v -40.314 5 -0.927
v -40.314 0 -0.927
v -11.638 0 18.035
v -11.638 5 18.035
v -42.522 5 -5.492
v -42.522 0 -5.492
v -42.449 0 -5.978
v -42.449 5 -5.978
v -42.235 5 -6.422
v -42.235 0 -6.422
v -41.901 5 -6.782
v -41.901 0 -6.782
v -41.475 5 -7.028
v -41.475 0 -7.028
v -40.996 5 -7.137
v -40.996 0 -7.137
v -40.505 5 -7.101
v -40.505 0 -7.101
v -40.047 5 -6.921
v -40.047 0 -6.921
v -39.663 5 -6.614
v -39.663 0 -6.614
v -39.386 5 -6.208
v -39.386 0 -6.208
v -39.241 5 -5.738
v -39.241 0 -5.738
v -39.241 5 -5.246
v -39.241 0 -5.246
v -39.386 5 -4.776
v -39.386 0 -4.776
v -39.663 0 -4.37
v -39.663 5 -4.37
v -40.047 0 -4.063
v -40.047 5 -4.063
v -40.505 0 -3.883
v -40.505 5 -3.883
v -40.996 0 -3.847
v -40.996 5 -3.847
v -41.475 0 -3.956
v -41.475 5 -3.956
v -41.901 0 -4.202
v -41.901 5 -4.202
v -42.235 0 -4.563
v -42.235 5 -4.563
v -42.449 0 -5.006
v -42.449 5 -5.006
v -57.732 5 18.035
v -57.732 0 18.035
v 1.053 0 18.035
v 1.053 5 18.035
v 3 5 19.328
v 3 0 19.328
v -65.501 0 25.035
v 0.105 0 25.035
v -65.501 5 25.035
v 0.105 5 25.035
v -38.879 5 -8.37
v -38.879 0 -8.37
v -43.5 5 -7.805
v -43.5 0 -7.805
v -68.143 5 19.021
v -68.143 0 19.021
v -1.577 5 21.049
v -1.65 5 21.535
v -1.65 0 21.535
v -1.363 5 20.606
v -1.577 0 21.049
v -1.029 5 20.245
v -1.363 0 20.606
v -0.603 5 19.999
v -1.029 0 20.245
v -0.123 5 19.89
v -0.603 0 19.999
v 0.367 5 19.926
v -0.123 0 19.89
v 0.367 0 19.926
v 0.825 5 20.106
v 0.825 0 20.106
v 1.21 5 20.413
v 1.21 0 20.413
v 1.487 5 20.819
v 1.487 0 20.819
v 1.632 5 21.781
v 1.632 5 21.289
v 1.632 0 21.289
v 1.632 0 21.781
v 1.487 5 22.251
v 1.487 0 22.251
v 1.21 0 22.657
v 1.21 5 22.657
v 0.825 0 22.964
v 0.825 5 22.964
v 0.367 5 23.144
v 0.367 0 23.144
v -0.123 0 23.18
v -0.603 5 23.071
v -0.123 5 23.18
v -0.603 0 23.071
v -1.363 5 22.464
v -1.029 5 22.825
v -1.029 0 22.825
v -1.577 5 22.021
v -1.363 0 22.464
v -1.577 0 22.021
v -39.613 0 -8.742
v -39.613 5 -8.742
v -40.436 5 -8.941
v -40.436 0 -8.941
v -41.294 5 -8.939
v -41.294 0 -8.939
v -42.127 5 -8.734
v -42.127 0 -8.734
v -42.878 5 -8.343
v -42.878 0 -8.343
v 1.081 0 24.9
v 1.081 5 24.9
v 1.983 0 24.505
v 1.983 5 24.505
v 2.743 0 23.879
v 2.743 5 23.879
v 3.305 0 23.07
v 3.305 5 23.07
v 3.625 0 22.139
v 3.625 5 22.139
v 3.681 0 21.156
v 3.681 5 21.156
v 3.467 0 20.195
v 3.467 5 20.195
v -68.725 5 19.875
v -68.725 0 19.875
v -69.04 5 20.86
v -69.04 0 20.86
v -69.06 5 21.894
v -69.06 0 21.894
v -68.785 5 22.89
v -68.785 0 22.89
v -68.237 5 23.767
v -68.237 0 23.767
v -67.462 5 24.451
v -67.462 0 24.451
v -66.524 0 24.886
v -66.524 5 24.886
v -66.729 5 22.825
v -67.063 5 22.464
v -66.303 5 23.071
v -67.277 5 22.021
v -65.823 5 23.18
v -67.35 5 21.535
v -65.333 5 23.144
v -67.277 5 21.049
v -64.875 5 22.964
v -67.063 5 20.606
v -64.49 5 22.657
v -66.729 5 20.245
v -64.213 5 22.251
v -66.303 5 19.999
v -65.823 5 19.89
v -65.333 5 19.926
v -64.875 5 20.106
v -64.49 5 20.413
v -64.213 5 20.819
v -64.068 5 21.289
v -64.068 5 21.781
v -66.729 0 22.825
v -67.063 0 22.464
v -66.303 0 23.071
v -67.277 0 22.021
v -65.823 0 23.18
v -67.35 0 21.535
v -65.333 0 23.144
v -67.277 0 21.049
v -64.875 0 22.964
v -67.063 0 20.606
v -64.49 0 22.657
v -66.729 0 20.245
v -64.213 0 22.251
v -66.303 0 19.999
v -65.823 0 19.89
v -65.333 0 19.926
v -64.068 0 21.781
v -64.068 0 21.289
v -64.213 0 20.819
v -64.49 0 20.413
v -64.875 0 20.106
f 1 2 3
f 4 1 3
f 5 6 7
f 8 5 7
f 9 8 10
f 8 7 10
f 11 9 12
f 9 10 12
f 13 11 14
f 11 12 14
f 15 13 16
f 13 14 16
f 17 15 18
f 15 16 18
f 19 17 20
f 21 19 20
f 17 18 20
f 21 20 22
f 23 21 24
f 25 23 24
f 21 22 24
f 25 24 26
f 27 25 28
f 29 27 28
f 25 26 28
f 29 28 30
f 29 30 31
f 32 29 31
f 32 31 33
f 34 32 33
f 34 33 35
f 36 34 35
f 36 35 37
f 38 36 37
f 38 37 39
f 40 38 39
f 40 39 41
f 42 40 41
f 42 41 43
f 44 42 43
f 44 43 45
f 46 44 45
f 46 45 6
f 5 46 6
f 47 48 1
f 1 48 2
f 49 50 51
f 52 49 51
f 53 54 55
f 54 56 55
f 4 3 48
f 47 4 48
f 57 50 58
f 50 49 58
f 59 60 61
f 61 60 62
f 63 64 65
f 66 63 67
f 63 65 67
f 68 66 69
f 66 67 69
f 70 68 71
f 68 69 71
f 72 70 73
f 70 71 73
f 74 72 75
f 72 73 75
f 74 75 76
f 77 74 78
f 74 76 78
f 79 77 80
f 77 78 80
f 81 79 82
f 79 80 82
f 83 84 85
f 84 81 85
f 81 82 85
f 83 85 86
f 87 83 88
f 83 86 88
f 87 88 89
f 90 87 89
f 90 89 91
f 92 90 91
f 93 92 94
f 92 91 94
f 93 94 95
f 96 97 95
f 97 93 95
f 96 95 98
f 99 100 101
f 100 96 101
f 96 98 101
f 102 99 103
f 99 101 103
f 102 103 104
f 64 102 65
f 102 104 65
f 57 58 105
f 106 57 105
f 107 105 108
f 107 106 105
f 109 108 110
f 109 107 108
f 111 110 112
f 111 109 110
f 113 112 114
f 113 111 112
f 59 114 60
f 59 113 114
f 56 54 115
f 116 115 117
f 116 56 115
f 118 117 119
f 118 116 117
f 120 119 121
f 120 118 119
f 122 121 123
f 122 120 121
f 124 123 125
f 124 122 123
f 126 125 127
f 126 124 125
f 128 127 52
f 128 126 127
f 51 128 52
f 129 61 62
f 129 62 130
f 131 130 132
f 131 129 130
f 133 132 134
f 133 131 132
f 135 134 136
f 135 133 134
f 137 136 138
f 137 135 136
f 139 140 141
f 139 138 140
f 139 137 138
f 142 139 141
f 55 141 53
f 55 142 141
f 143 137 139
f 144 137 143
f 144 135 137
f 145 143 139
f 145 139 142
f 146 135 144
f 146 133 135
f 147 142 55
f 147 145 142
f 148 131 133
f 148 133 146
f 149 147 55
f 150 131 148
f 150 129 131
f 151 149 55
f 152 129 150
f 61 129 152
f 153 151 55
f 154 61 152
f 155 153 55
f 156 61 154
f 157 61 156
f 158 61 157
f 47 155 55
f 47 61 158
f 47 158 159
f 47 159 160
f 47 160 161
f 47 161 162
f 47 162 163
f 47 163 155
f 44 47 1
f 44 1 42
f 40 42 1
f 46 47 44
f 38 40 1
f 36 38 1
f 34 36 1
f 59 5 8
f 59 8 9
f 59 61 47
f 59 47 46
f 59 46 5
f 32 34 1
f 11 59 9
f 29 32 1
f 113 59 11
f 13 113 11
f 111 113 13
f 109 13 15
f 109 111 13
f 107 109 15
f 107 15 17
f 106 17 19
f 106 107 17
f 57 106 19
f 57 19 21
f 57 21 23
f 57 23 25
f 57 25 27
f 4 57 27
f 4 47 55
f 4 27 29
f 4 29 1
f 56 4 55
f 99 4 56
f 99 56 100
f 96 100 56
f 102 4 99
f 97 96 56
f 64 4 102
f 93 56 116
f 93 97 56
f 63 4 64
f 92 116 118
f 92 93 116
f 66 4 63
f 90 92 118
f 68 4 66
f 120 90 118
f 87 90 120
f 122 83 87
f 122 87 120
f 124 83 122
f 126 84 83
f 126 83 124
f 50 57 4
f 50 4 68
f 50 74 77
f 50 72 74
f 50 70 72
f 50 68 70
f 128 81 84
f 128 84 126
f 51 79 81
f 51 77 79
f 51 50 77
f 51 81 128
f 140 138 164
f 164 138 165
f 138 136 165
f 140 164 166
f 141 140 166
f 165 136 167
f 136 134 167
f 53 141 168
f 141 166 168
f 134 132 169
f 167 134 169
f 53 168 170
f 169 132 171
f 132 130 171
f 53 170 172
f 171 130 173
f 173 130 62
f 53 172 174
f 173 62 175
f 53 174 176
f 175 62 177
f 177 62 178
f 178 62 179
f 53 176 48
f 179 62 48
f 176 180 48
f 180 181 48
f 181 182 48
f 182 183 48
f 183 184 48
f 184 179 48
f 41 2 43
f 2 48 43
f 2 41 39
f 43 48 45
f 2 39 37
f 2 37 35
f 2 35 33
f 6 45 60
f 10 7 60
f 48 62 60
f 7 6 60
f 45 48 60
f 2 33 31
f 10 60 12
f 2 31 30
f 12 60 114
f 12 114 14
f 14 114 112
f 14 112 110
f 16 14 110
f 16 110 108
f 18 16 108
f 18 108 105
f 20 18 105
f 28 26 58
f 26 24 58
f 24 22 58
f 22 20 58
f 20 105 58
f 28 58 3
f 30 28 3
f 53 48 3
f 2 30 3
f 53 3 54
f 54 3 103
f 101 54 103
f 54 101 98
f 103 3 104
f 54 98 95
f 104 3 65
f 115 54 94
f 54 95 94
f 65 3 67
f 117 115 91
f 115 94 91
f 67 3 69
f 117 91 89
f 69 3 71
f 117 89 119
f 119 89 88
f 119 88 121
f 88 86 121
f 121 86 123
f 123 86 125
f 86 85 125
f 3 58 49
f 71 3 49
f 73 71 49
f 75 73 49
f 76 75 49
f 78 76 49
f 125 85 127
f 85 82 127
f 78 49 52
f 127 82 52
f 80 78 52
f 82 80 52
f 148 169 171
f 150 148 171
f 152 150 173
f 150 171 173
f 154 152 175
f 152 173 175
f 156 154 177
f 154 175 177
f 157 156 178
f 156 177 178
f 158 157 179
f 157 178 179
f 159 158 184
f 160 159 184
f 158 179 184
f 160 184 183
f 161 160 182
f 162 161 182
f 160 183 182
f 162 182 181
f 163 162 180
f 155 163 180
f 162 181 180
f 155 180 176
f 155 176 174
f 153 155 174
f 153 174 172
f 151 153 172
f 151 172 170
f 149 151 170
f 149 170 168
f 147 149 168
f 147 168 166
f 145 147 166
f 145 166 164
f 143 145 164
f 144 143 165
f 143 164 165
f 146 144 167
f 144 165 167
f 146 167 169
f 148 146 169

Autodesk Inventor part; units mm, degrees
ref_plane "YZ Plane" through (0, 0, 0) normal (1, 0, 0) x (0, 1, 0)
ref_plane "XZ Plane" through (0, 0, 0) normal (0, 1, 0) x (-1, 0, 0)
ref_plane "XY Plane" through (0, 0, 0) normal (0, 0, 1) x (1, 0, 0)
sketch "Sketch1" plane through (0, 0, 0) normal (0, 1, 0) x (-1, 0, 0)
  line L0 (0, 21.535) -> (65.7, 21.535)
  line L1 (0, 21.535) -> (40.8722, -5.4921)
  line L2 (0, 21.535) -> (49, 21.535) construction
  line L3 (40.8722, -5.4921) -> (65.7, 21.535)
  line L4 (65.7, 21.535) -> (68.7, 21.535)
  line L5 (68.7, 21.535) -> (0, 21.535)
  line L6 (0, 21.535) -> (-3, 21.535)
  line L7 (40.8722, -5.4921) -> (43.3746, -7.1468)
  line L8 (65.7, 21.535) -> (38.8426, -7.7015)
  line L9 (137.4, 18.035) -> (137.4, 25.035)
  line L10 (137.4, 25.035) -> (0, 25.035)
  line L11 (0, 25.035) -> (0, 18.035)
  line L12 (0, 18.035) -> (137.4, 18.035)
  line L13 (137.4, 18.035) -> (0, 25.035) construction
  line L14 (137.4, 25.035) -> (0, 18.035) construction
  line L15 (93.1053, 46.1943) -> (87.9503, 50.9298)
  line L16 (87.9503, 50.9298) -> (38.2947, -3.1243)
  line L17 (38.2947, -3.1243) -> (43.4497, -7.8599)
  line L18 (43.4497, -7.8599) -> (93.1053, 46.1943)
  line L19 (93.1053, 46.1943) -> (38.2947, -3.1243) construction
  line L20 (87.9503, 50.9298) -> (43.4497, -7.8599) construction
  line L21 (79.8139, -35.4386) -> (83.6749, -29.5997)
  line L22 (83.6749, -29.5997) -> (1.9305, 24.4544)
  line L23 (1.9305, 24.4544) -> (-1.9305, 18.6155)
  line L24 (-1.9305, 18.6155) -> (79.8139, -35.4386)
  line L25 (79.8139, -35.4386) -> (1.9305, 24.4544) construction
  line L26 (83.6749, -29.5997) -> (-1.9305, 18.6155) construction
  line L27 (38.8426, -7.7015) -> (38.4743, -8.1025)
  line L28 (68.7, 21.535) -> (68.7, 25.035)
  line L29 (68.7, 21.535) -> (68.7, 18.035)
  line L30 (0, 25.035) -> (-3, 25.035)
  line L31 (-3, 25.035) -> (-3, 18.035)
  line L32 (-3, 18.035) -> (0, 18.035)
  line L33 (50.67, 0) -> (41.4309, -10.0576)
  circle A0 centre (65.7, 21.535) radius 1.65
  circle A1 centre (40.8722, -5.4921) radius 1.65
  circle A2 centre (0, 21.535) radius 1.65
  point P0 (0, 0)
  point P1 (40.3135, -0.9267)
  point P2 (11.6384, 18.035)
  point P3 (57.7322, 18.035)
  point P4 (-1.0525, 18.035)
  point P5 (73.6678, 25.035)
  dimension "d0" = 65.7
  dimension "d2" = 33.475
  dimension "d3" = 3
  dimension "d4" = 3
  dimension "d7" = 39.7
  dimension "d8" = 7
  dimension "d9" = 7
  dimension "d10" = 7
  dimension "d11" = 3.3
  dimension "d12" = 3.3
  dimension "d13" = 3.3
extrude "Extrusion1" add sketch "Sketch1" along normal blind 5 contours A2 L23 L22 L0 | L0 L22 L12 L1 A2 | L1 L12 L11 A2 | A2 L23 L24 L32 L31 L6 | L6 L31 L30 L11 A2 | L11 L10 L16 L0 L22 L23 A2 | L11 L32 L24 L23 A2 | L0 L16 L12 L22 | L12 L22 L16 L17 A1 L1 | L1 A1 L8 L27 L24 L32 L12 | L16 L10 L28 L4 A0 L0 | L0 A0 L3 L12 L16 | L12 L3 L22 L16 | L22 L3 A1 L17 L16 | A1 L17 L33 L24 L27 L8 | L10 L18 L29 L28 | L4 L29 L18 L12 L3 A0 | L12 L18 L22 L3 | L22 L18 L17 A1 L3
sketch "Sketch2" plane through (0, 5, 0) normal (0, 1, 0) x (1, 0, 0)
  line L0 (1.0525, -18.035) -> (-41.4309, 10.0576) projected
  line L1 (-41.4309, 10.0576) -> (11.6284, -25.035)
  line L2 (-41.4309, 10.0576) -> (22.1833, 10.0576) construction
  line L3 (-73.6678, -25.035) -> (3, -25.035) projected
  line L4 (11.6284, -25.035) -> (3, -25.035)
  line L5 (3, -25.035) -> (3, -18.035) projected
  line L6 (3, -18.035) -> (3, -25.035)
  point P0 (0, 0)
  point P1 (3, -19.3283)
  dimension "d16" = 33.48
extrude "Extrusion2" add sketch "Sketch2" against normal up to surface (5 mm away)
sketch "Sketch3" plane through (0, 5, 0) normal (0, 1, 0) x (1, 0, 0)
  line L0 (3, -18.035) -> (1.0525, -18.035) projected
  line L1 (11.6284, -25.035) -> (3, -19.3283) projected
  line L2 (1.0525, -18.035) -> (3, -19.3283)
  line L3 (3, -19.3283) -> (3, -18.035)
  line L4 (3, -18.035) -> (1.0525, -18.035)
  point P0 (0, 0)
extrude "Extrusion3" cut sketch "Sketch3" against normal blind 10
fillet "Fillet1" radius 3.5875 2 edges at (-73.6678, 2.5, 25.035) (-41.4309, 2.5, -10.0576)
fillet "Fillet2" radius 3.5875 1 edges at (11.6284, 2.5, 25.035)
properties part number "ghi"
